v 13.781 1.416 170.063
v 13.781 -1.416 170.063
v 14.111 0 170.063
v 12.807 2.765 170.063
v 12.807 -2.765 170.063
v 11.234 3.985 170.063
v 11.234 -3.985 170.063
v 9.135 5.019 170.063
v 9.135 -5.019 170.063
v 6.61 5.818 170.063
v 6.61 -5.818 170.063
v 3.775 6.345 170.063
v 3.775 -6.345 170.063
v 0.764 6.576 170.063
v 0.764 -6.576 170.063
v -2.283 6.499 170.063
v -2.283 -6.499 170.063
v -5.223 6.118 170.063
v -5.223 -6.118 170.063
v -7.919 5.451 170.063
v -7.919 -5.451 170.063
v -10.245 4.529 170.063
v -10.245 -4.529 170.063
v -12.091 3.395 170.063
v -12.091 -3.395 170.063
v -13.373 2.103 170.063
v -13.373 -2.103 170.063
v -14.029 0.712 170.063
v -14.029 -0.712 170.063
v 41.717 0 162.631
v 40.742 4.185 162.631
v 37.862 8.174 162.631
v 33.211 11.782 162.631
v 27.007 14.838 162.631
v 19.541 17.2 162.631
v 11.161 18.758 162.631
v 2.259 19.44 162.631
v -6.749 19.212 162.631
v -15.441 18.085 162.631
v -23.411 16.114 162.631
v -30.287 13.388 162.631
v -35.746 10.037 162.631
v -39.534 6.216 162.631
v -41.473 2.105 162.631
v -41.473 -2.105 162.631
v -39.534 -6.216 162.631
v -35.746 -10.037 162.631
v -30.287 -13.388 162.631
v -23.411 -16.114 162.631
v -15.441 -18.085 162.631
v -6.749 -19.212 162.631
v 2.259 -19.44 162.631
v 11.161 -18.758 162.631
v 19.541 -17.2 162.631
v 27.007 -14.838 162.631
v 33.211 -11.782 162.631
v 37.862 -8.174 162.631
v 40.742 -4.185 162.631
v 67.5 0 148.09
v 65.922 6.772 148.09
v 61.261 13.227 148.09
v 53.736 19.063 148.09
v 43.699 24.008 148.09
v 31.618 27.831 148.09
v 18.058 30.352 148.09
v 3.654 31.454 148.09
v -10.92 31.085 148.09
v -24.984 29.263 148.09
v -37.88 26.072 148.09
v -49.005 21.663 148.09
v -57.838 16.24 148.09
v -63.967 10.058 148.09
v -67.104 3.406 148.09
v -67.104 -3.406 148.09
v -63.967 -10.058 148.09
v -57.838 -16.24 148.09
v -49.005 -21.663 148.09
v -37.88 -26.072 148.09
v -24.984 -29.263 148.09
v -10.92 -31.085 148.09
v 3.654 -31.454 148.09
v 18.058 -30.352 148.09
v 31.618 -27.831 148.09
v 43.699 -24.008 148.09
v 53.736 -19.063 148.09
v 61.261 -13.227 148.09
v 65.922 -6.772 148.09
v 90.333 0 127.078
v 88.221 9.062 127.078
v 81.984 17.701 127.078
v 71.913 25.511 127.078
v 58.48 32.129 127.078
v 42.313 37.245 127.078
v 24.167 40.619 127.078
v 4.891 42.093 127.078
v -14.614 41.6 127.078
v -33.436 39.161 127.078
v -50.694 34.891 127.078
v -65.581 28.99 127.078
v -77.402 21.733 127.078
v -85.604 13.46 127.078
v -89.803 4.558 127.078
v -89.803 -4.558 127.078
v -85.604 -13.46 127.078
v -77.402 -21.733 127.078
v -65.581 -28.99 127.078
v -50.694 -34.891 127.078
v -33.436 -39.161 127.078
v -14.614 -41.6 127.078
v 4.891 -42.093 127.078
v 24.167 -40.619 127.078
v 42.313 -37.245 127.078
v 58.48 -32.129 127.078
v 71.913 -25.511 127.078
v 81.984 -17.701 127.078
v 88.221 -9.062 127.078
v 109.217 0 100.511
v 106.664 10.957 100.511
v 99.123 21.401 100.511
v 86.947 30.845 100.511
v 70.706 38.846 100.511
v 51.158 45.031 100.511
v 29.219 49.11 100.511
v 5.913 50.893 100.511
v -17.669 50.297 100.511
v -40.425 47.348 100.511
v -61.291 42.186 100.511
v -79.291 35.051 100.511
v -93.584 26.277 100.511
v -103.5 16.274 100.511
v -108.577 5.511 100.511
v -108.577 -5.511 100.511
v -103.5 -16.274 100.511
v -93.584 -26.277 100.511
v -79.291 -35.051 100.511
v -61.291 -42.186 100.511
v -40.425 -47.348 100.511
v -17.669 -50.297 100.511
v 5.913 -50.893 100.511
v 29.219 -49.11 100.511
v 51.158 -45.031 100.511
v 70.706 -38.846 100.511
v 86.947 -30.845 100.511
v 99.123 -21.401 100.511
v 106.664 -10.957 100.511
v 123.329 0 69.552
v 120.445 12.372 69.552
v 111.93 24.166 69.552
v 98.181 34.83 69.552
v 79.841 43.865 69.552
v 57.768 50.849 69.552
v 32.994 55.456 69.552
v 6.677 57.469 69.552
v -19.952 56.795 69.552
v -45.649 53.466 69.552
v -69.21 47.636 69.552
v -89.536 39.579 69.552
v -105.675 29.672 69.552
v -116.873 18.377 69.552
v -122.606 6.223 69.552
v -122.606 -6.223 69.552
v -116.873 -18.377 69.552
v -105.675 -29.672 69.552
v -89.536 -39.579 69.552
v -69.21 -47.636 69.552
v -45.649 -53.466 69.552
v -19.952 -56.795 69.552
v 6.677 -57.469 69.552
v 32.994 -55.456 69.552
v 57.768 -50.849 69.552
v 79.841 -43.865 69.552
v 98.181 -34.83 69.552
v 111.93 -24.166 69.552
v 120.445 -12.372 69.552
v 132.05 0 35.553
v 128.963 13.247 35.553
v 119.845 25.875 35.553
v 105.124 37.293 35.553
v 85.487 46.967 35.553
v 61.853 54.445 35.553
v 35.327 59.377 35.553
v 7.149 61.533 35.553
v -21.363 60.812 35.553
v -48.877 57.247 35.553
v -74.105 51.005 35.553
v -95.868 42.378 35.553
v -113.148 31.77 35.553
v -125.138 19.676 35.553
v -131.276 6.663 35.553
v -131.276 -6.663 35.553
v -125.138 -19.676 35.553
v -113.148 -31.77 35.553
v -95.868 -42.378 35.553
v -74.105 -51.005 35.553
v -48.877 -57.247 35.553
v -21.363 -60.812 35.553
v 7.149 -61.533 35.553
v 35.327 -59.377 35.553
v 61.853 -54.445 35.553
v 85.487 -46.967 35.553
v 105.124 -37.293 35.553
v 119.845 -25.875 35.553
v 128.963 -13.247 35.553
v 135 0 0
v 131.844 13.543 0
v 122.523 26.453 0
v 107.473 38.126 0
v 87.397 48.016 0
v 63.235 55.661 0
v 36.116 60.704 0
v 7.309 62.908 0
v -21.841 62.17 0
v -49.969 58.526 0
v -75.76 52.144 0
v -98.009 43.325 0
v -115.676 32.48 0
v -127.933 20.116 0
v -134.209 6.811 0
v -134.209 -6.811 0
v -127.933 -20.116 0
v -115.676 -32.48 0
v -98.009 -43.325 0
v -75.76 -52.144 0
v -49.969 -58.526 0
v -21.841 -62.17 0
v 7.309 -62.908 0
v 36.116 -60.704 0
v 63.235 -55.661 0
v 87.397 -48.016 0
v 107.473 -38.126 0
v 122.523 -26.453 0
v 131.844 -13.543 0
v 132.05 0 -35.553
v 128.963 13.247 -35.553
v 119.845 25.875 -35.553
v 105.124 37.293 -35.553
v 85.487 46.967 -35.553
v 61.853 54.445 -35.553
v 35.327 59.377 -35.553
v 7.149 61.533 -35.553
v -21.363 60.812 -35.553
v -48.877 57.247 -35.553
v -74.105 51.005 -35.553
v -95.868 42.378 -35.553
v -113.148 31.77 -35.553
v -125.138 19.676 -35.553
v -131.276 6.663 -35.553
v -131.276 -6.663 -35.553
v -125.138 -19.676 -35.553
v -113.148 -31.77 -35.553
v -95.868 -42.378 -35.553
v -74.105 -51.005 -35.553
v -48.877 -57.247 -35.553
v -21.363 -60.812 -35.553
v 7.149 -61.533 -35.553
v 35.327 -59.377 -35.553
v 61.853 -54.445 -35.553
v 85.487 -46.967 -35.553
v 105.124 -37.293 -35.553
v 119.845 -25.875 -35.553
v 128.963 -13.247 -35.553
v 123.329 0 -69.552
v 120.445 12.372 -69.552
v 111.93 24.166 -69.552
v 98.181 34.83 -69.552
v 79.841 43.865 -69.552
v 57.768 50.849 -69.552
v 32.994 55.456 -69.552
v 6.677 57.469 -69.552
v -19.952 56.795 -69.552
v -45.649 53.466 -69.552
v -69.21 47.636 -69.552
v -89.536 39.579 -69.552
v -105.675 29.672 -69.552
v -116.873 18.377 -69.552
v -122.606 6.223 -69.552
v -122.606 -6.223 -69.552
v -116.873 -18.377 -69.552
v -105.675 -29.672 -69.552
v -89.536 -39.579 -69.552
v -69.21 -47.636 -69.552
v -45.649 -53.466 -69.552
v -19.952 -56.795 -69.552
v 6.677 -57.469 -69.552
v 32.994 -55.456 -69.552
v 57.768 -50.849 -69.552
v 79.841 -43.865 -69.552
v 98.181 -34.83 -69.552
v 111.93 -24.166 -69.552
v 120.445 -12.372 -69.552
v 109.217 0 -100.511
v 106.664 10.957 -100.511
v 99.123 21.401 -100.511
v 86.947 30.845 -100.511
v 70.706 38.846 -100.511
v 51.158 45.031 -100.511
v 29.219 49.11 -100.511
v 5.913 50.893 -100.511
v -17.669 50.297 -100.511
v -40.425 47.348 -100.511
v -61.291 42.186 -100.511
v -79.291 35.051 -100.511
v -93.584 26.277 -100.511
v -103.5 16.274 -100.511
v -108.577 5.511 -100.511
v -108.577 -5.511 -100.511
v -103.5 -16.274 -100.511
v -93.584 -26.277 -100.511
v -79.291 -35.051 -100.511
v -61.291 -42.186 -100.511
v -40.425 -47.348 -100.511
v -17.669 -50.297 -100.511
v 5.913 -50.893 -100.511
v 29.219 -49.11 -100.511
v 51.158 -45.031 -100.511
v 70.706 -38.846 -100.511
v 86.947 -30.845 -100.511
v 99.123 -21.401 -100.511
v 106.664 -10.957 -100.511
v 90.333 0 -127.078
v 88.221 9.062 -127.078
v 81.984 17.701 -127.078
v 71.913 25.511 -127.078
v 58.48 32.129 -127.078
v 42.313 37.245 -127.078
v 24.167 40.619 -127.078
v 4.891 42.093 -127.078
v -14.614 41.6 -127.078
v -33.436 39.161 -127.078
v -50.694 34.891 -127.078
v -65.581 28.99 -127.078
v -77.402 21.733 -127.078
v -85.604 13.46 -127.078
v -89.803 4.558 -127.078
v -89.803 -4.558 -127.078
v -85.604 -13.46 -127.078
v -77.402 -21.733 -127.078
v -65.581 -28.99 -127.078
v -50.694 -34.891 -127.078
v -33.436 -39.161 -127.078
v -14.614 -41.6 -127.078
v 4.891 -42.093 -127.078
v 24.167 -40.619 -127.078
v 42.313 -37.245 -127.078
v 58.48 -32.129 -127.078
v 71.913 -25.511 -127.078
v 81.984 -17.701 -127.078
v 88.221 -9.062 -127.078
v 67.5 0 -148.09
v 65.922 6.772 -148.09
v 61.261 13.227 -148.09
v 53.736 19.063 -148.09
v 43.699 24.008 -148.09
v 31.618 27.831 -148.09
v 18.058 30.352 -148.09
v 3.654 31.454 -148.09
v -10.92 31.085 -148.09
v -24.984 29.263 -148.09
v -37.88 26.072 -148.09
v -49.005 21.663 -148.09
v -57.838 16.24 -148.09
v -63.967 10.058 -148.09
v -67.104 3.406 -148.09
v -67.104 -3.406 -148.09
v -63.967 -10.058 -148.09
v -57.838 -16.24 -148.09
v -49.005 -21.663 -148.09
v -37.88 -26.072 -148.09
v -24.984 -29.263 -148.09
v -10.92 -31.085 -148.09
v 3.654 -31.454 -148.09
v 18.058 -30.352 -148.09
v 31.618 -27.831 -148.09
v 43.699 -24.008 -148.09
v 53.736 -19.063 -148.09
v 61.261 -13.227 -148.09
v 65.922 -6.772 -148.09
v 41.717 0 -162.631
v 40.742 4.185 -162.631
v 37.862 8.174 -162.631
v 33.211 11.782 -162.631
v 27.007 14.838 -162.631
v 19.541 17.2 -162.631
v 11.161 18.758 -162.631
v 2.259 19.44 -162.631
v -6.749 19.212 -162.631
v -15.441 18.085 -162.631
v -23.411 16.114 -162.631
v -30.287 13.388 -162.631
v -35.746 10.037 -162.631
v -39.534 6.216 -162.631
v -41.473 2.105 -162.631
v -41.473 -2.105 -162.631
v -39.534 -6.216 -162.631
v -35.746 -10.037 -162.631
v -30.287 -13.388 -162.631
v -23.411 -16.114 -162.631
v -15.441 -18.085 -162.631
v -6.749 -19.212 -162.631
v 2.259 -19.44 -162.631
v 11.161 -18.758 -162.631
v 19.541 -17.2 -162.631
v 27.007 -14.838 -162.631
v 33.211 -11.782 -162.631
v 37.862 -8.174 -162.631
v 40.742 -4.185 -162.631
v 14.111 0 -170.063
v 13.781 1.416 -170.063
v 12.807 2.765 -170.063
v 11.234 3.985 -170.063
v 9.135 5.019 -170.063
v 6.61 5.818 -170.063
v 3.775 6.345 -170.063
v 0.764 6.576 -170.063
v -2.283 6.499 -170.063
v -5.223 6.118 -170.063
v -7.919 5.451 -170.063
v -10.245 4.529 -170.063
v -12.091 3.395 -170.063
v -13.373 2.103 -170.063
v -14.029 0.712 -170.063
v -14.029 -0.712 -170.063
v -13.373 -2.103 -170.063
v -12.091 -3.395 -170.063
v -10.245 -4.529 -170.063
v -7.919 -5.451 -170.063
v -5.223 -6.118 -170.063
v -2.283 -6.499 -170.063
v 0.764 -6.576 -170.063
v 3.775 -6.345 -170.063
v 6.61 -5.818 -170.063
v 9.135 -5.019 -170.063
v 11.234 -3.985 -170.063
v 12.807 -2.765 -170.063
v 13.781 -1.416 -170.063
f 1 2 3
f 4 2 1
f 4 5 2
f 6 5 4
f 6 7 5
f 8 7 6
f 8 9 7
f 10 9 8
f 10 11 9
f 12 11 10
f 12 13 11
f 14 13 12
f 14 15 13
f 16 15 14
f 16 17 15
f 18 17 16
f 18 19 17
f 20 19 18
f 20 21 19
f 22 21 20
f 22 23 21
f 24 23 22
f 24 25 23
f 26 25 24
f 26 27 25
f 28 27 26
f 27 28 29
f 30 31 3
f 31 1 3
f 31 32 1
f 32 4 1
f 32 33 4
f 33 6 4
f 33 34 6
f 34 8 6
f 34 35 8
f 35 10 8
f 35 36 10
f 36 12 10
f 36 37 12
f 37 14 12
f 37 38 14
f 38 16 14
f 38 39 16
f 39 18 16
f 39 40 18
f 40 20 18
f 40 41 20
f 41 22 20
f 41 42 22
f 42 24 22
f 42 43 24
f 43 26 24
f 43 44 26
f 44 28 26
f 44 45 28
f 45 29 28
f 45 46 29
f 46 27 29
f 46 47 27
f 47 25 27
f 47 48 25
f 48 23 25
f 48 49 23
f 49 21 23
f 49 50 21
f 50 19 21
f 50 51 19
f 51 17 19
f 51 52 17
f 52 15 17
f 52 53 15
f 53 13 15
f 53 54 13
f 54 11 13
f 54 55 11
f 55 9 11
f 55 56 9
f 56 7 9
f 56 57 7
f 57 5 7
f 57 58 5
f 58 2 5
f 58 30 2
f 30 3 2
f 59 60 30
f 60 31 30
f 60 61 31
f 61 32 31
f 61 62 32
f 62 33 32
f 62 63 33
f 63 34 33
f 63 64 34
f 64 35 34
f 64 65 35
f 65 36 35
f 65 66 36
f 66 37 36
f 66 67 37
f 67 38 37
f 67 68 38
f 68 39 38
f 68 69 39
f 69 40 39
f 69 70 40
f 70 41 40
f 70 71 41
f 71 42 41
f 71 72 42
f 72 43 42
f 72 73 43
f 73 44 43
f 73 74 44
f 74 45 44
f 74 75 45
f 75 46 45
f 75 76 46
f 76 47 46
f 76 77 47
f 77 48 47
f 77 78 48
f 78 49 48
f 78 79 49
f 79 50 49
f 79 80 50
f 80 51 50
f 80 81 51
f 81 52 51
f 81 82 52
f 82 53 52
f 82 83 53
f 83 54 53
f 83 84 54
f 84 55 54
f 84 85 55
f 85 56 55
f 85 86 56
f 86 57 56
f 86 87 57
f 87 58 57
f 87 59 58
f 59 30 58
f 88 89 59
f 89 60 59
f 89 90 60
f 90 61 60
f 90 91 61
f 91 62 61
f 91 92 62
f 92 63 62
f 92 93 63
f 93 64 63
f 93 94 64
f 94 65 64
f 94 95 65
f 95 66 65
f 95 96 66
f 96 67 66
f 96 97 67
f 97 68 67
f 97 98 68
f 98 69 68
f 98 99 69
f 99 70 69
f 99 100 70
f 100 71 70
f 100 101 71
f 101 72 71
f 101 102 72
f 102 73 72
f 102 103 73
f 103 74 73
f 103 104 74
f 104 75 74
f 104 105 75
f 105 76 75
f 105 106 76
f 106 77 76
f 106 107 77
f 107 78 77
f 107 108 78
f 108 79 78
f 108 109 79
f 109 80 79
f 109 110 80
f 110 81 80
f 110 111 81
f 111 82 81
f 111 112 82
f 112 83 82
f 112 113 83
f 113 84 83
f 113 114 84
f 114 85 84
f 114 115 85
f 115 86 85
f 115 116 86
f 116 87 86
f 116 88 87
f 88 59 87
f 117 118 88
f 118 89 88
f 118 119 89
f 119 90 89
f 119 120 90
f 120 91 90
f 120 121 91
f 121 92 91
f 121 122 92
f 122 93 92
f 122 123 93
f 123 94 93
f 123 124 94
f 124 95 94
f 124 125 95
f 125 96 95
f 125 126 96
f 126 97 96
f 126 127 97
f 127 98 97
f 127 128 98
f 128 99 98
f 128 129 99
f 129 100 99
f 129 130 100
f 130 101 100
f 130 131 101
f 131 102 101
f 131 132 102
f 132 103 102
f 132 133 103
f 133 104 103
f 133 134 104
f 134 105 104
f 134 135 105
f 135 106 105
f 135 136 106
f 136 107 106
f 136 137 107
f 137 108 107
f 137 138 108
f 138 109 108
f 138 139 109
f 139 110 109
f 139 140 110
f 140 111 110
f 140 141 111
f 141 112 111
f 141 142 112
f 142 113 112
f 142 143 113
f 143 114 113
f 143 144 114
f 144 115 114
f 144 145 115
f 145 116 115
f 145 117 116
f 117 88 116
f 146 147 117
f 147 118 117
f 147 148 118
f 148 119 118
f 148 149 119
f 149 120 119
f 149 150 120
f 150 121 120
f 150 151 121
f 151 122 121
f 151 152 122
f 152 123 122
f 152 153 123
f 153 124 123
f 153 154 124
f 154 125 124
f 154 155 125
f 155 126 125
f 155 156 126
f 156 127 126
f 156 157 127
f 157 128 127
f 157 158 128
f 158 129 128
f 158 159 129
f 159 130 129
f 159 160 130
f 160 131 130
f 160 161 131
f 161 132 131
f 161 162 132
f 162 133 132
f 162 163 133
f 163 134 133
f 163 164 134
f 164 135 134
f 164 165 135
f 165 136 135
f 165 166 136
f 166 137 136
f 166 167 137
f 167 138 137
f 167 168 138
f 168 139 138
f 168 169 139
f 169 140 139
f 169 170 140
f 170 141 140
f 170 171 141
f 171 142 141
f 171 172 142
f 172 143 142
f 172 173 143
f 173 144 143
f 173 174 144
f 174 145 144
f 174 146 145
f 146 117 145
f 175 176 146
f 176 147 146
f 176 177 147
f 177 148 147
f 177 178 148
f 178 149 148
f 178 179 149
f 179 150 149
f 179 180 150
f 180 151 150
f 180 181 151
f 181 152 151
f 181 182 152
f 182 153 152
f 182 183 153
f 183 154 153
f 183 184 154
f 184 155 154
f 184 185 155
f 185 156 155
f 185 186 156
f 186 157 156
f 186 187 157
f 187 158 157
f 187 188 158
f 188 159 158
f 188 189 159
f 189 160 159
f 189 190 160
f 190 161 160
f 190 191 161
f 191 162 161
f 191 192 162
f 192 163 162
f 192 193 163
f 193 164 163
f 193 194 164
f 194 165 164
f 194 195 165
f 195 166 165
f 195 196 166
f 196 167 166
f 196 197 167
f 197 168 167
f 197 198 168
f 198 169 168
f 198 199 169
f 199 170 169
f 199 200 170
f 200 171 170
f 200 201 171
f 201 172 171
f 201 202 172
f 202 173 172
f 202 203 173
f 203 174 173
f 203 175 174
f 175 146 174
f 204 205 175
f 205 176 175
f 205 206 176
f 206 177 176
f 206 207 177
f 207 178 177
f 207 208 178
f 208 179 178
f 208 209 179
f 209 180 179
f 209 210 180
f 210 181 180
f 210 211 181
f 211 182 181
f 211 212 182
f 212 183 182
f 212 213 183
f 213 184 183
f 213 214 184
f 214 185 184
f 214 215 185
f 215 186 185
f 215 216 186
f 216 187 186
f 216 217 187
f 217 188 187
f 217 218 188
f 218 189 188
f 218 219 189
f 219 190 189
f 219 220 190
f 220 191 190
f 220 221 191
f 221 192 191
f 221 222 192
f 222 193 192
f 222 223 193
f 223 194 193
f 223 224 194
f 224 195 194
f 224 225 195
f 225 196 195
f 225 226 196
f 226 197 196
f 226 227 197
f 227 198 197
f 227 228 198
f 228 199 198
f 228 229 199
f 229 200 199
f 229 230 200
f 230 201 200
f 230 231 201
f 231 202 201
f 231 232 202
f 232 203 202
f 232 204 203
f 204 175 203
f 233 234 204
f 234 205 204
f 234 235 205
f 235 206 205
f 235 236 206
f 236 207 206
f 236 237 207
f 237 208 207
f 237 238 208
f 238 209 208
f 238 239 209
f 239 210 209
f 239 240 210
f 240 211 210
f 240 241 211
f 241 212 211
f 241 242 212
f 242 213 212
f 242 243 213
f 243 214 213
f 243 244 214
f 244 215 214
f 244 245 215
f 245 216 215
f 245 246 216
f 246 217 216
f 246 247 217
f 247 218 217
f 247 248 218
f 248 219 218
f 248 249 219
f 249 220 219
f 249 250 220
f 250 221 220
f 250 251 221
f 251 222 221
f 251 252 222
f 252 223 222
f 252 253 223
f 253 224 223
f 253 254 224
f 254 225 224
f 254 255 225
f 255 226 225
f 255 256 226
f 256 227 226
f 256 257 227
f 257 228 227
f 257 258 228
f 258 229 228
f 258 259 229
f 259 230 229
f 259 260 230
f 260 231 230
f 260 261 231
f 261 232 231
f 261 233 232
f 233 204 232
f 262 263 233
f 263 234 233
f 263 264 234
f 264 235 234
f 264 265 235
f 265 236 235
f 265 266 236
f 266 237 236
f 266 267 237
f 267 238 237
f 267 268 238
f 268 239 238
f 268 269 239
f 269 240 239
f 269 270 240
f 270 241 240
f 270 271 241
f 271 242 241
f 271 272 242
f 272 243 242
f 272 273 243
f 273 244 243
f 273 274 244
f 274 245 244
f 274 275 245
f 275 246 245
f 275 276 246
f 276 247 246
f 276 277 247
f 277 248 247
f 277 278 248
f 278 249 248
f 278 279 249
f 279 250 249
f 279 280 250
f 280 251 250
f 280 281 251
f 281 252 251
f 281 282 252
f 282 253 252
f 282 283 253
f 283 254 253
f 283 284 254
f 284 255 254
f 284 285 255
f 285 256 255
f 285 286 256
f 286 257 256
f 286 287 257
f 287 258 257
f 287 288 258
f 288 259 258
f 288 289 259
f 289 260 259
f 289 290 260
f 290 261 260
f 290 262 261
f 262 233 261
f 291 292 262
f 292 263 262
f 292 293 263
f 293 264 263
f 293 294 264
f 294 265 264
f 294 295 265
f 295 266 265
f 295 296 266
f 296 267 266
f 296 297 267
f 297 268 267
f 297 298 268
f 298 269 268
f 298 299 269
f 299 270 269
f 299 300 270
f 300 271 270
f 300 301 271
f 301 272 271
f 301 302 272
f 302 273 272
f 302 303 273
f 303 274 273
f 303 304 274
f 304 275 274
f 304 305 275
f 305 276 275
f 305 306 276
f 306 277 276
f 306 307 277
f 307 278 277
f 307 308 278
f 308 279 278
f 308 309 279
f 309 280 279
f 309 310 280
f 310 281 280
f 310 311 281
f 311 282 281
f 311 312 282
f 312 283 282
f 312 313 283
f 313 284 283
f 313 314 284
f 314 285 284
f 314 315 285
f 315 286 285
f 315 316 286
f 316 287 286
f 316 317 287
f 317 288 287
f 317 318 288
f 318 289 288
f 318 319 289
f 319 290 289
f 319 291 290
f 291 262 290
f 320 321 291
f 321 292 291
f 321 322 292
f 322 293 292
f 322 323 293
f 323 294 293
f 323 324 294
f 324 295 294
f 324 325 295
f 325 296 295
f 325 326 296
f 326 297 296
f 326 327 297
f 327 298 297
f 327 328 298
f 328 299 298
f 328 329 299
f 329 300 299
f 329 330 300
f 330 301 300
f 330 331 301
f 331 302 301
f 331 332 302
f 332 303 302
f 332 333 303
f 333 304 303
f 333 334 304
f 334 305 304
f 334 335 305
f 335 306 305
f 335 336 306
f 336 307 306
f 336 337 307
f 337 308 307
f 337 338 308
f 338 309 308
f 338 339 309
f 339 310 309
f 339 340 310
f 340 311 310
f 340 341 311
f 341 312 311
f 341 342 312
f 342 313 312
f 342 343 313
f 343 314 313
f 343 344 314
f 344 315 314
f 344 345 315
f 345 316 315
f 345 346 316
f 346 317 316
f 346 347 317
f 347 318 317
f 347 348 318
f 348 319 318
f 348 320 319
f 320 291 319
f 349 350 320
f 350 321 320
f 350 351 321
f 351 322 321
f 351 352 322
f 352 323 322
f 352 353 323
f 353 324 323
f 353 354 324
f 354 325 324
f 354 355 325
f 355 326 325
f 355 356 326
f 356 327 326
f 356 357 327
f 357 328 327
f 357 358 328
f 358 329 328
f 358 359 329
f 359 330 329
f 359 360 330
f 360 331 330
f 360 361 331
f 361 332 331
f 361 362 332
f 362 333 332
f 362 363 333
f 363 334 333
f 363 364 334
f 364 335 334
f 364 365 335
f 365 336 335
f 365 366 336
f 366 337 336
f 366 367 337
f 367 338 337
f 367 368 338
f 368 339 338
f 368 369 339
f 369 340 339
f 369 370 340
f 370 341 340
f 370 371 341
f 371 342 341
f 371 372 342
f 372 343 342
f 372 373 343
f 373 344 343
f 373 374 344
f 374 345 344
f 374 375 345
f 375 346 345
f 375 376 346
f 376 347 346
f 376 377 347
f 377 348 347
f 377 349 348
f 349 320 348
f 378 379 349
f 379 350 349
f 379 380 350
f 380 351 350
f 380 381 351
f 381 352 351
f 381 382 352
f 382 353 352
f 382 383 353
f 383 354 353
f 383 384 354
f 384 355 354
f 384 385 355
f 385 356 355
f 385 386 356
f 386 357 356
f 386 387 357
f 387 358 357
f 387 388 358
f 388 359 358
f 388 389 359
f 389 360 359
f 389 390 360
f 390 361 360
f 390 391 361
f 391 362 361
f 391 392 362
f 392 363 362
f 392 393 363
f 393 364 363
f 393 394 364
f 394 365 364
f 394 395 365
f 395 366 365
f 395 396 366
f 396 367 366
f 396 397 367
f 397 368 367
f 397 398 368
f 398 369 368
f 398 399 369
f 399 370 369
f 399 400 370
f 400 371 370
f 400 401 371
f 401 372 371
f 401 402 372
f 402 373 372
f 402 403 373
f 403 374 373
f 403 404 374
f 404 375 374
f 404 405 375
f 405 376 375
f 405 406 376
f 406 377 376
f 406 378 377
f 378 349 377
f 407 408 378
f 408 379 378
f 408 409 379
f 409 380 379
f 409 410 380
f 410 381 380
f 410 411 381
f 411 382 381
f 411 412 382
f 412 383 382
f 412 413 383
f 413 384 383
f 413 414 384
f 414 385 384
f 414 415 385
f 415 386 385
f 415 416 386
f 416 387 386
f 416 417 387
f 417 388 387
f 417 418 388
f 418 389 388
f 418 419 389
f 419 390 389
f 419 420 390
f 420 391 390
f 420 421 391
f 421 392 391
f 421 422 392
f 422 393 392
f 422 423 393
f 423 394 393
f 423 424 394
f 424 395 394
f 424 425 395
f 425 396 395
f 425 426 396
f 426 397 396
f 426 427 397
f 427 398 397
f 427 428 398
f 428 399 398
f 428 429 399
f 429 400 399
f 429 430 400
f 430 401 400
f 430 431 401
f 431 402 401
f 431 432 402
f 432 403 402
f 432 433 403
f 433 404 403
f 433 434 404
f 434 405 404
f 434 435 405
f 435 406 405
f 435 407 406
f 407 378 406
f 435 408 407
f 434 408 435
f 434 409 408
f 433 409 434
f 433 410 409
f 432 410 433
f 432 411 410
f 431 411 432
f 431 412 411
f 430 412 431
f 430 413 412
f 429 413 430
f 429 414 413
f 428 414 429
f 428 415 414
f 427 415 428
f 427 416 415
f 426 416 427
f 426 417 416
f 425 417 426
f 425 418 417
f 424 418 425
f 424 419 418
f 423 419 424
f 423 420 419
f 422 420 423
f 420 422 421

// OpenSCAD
// Generated by SolidPython 1.0.1 on 2020-07-29 00:46:51


scale(v = [15, 7, 19]) {
	sphere(r = 9);
}
/***********************************************
*********      SolidPython code:      **********
************************************************
 
# import packages: SolidPython
from solid import *
from solid.utils import *
from itertools import chain, combinations, permutations


class Resize:

    def __init__(self, scad_file):
        self.scad_file = scad_file
        #self.scad_file = import_scad(scad_file)
        # cone/cylinder param:
        self.r1 = 0
        self.r2 = 0
        self.h = 0
        # rectangular prism param:
        self.w = 0
        self.l = 0
        # ellipse param:
        self.r = 0

    # import OpenScad code (file name corresponds to shape)


    # classify shape + parameters
    def assign(self, param1, param2, param3):
        if self.scad_file == 'cone.scad':
            self.r1 = param1
            self.r2 = param2
            self.h = param3
        elif self.scad_file == 'cylinder.scad':
            self.r1 = param1
            self.r2 = param2
            self.h = param3
        elif self.scad_file == 'rectangularPrism.scad':
            self.h = param1
            self.l = param2
            self.w = param3
        else:
            self.r = param1
            self.h = param2

    # resize parameters
    def iterate(self):
        x = range(3, 20, 2)
        i = 1
        if self.scad_file == 'cone.scad':
            tempList = list(permutations(x, 2))
            for temp in tempList:
                param1 = temp[0]
                param2 = temp[1]
                filepath = 'produced_scad_files/' + 'cone' + str(param1) + '_' + str(param2) + '_' + '.scad'
                scad_render_to_file(cylinder(h=param1, r1=param2, r2=0), filepath)

        elif self.scad_file == 'cylinder.scad':
            tempList = list(permutations(x, 3))
            for temp in tempList:
                param1 = temp[0]
                param2 = temp[1]
                filepath = 'produced_scad_files/' + 'cylinder' + str(param1) + '_' + str(param2) + '_' + '.scad'
                scad_render_to_file(cylinder(h=param1, r1=param2, r2=param2), filepath)

        elif self.scad_file == 'rectangularPrism.scad':
            tempList = list(permutations(x, 3))
            for temp in tempList:
                param1 = temp[0]
                param2 = temp[1]
                param3 = temp[2]
                filepath = 'produced_scad_files/' + 'rectangularPrism' + str(param1) + '_' + str(param2) + '_' + str(
                    param3) + '.scad'
                scad_render_to_file(cube(size=(param1, param2, param3)), filepath)

        elif self.scad_file == 'ellipse.scad':
            tempList = list(permutations(x, 4))
            for temp in tempList:
                param1 = temp[0]
                param2 = temp[1]
                param3 = temp[2]
                param4 = temp[3]
                filepath = 'produced_scad_files/' + 'ellipse' + str(param1) + '_' + str(param2) + '_' + str(param3) + '_' + str(param4) + '.scad'
                scad_render_to_file(scale([param1, param2, param3])(sphere(r=param4)), filepath)

    def render_to_scadfile(self):
        scad_render_to_file(scad, 'example.scad') 
 
************************************************/
